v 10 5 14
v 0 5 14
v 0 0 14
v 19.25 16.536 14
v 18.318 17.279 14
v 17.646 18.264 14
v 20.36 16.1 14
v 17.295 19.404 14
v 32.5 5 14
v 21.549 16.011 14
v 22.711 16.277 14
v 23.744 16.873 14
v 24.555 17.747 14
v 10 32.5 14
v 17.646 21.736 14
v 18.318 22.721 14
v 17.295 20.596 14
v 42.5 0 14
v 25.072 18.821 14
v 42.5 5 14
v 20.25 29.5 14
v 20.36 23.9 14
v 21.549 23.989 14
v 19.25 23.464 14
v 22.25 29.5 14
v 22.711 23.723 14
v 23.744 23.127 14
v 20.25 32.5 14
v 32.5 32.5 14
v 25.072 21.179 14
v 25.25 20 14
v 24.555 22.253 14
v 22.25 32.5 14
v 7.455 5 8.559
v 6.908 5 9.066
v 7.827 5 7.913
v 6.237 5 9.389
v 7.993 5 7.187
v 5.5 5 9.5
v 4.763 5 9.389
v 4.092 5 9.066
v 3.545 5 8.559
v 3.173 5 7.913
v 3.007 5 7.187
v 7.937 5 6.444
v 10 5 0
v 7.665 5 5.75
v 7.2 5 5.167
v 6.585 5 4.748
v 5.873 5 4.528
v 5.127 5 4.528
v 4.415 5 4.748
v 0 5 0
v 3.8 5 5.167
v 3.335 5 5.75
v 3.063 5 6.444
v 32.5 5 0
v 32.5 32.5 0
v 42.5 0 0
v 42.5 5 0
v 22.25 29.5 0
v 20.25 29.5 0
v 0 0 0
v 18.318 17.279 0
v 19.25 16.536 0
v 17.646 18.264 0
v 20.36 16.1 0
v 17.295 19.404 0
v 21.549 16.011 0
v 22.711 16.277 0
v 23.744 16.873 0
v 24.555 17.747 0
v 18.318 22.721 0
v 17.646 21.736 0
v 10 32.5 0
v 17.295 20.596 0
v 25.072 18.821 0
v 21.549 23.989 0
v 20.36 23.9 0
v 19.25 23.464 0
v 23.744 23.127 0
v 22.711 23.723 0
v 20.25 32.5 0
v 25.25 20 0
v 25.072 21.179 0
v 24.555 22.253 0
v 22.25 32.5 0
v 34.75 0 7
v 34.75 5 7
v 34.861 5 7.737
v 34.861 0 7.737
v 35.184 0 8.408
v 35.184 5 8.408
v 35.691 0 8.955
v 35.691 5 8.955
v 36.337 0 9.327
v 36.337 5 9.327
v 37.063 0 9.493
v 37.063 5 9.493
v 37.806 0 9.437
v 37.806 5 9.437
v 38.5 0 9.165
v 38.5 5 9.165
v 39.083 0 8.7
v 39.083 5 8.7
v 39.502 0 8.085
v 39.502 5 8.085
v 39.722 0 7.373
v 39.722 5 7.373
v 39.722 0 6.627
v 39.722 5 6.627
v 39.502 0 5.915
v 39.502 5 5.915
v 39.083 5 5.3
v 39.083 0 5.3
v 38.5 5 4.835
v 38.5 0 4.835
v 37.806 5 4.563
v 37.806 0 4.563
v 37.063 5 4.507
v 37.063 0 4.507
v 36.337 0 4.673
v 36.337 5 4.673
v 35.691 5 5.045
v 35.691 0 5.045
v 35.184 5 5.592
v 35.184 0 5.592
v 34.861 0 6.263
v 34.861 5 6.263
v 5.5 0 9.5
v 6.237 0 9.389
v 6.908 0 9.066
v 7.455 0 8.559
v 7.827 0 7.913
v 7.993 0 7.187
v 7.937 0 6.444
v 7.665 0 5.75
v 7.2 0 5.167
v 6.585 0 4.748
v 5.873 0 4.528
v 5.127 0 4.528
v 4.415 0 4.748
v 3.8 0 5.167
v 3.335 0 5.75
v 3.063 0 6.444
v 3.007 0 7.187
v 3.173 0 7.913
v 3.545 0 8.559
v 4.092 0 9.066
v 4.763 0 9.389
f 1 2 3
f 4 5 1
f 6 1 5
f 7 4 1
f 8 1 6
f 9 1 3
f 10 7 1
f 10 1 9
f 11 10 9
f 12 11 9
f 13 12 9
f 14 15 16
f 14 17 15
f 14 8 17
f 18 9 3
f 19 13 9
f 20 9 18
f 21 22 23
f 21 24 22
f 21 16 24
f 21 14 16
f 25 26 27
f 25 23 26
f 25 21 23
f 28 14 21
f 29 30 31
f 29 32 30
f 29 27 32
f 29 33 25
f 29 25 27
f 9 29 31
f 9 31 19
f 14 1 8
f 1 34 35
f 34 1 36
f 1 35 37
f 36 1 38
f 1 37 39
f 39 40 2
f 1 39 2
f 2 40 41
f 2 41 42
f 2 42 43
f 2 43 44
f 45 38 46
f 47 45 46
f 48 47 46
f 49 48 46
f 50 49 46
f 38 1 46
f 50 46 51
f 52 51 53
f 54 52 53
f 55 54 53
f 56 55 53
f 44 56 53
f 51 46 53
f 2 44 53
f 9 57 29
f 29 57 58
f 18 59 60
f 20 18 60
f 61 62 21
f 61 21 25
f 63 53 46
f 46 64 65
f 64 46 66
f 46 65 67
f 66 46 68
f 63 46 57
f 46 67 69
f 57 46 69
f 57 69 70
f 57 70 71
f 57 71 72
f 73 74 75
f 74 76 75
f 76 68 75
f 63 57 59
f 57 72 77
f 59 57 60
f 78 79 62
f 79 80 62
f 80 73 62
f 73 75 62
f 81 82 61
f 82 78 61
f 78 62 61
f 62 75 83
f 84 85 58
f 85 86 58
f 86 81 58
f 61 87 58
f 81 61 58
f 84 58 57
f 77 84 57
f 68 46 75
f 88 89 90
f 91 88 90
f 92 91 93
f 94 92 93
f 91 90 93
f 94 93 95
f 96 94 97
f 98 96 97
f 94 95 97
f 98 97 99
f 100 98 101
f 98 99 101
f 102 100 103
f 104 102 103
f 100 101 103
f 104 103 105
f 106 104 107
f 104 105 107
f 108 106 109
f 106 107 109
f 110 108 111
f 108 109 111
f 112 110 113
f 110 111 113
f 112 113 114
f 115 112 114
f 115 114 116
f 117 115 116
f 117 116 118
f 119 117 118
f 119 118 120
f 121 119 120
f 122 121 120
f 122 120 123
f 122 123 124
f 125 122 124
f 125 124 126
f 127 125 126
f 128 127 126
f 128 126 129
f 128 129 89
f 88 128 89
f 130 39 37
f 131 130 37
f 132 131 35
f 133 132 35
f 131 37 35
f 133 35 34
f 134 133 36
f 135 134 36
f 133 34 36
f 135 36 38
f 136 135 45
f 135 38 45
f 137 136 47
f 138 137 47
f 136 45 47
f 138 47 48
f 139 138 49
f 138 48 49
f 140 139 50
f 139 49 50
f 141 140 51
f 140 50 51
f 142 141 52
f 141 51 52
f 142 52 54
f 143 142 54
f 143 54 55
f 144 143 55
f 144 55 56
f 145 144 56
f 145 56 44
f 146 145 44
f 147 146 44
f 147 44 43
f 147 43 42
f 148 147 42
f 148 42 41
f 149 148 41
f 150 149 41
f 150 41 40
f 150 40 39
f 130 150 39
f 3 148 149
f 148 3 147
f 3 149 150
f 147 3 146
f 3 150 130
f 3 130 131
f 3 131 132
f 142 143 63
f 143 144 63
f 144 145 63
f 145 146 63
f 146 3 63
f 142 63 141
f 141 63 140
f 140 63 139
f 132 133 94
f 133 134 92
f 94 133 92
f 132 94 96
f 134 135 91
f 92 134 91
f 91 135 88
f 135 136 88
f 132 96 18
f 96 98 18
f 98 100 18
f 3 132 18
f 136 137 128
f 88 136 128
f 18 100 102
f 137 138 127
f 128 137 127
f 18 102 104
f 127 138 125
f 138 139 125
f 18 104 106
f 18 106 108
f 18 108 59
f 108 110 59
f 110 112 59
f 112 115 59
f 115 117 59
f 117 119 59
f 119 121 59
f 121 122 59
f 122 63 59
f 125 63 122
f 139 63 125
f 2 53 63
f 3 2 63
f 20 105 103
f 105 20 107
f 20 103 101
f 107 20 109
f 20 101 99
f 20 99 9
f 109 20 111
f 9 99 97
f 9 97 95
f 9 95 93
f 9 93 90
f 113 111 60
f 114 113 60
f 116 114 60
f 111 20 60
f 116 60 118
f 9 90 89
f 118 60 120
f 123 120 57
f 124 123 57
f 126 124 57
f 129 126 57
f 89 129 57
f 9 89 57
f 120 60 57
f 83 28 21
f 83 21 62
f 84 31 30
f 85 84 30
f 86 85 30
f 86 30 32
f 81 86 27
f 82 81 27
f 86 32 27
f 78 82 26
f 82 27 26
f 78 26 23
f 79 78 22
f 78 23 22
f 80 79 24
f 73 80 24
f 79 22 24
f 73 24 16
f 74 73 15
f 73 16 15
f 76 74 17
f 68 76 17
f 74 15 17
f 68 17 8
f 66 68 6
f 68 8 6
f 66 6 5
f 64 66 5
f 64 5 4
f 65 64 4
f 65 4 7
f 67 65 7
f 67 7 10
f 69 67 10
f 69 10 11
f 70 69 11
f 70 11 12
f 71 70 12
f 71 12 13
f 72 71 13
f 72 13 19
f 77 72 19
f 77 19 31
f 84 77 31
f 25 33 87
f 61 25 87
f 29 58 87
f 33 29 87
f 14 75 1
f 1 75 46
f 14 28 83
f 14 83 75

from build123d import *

# Parameters (mm, degrees)
BOSS_EXTRUDE1_DEPTH = 14
SKETCH2_R           = 4
CUT_EXTRUDE1_DEPTH  = 56.303706928
SKETCH3_R           = 2.5
CUT_EXTRUDE2_DEPTH  = 14
SKETCH4_R           = 2.5
CUT_EXTRUDE3_DEPTH  = 14
SKETCH5_W           = 2
SKETCH5_H           = 14
CUT_EXTRUDE4_DEPTH  = 3


with BuildPart() as part:
    # Sketch1 → Boss-Extrude1 (new body)
    with BuildSketch(Plane.XY):
        Polygon((0, 0), (42.5, 0), (42.5, 5), (32.5, 5), (32.5, 32.5), (10, 32.5), (10, 5), (0, 5), align=None)
    extrude(amount=BOSS_EXTRUDE1_DEPTH)

    # Sketch2 → Cut-Extrude1 (cut, through all)
    with BuildSketch(Plane.XY.offset(14)):
        with Locations((21.25, 20)):
            Circle(SKETCH2_R)
    extrude(amount=-CUT_EXTRUDE1_DEPTH, mode=Mode.SUBTRACT)

    # Sketch3 → Cut-Extrude2 (cut)
    with BuildSketch(Plane(origin=(0, 5, 0), x_dir=(1, 0, 0), z_dir=(0, 1, 0))):
        with Locations(Location((5.5, -7, 0), (0, 0, 270))):
            Circle(SKETCH3_R)
    extrude(amount=-CUT_EXTRUDE2_DEPTH, mode=Mode.SUBTRACT)

    # Sketch4 → Cut-Extrude3 (cut)
    with BuildSketch(Plane(origin=(0, 5, 0), x_dir=(1, 0, 0), z_dir=(0, 1, 0))):
        with Locations(Location((37.25, -7, 0), (0, 0, 180))):
            Circle(SKETCH4_R)
    extrude(amount=-CUT_EXTRUDE3_DEPTH, mode=Mode.SUBTRACT)

    # Sketch5 → Cut-Extrude4 (cut)
    with BuildSketch(Plane(origin=(0, 32.5, 0), x_dir=(1, 0, 0), z_dir=(0, 1, 0))):
        with Locations((21.25, -7)):
            Rectangle(SKETCH5_W, SKETCH5_H)
    extrude(amount=-CUT_EXTRUDE4_DEPTH, mode=Mode.SUBTRACT)


solid = part.part
